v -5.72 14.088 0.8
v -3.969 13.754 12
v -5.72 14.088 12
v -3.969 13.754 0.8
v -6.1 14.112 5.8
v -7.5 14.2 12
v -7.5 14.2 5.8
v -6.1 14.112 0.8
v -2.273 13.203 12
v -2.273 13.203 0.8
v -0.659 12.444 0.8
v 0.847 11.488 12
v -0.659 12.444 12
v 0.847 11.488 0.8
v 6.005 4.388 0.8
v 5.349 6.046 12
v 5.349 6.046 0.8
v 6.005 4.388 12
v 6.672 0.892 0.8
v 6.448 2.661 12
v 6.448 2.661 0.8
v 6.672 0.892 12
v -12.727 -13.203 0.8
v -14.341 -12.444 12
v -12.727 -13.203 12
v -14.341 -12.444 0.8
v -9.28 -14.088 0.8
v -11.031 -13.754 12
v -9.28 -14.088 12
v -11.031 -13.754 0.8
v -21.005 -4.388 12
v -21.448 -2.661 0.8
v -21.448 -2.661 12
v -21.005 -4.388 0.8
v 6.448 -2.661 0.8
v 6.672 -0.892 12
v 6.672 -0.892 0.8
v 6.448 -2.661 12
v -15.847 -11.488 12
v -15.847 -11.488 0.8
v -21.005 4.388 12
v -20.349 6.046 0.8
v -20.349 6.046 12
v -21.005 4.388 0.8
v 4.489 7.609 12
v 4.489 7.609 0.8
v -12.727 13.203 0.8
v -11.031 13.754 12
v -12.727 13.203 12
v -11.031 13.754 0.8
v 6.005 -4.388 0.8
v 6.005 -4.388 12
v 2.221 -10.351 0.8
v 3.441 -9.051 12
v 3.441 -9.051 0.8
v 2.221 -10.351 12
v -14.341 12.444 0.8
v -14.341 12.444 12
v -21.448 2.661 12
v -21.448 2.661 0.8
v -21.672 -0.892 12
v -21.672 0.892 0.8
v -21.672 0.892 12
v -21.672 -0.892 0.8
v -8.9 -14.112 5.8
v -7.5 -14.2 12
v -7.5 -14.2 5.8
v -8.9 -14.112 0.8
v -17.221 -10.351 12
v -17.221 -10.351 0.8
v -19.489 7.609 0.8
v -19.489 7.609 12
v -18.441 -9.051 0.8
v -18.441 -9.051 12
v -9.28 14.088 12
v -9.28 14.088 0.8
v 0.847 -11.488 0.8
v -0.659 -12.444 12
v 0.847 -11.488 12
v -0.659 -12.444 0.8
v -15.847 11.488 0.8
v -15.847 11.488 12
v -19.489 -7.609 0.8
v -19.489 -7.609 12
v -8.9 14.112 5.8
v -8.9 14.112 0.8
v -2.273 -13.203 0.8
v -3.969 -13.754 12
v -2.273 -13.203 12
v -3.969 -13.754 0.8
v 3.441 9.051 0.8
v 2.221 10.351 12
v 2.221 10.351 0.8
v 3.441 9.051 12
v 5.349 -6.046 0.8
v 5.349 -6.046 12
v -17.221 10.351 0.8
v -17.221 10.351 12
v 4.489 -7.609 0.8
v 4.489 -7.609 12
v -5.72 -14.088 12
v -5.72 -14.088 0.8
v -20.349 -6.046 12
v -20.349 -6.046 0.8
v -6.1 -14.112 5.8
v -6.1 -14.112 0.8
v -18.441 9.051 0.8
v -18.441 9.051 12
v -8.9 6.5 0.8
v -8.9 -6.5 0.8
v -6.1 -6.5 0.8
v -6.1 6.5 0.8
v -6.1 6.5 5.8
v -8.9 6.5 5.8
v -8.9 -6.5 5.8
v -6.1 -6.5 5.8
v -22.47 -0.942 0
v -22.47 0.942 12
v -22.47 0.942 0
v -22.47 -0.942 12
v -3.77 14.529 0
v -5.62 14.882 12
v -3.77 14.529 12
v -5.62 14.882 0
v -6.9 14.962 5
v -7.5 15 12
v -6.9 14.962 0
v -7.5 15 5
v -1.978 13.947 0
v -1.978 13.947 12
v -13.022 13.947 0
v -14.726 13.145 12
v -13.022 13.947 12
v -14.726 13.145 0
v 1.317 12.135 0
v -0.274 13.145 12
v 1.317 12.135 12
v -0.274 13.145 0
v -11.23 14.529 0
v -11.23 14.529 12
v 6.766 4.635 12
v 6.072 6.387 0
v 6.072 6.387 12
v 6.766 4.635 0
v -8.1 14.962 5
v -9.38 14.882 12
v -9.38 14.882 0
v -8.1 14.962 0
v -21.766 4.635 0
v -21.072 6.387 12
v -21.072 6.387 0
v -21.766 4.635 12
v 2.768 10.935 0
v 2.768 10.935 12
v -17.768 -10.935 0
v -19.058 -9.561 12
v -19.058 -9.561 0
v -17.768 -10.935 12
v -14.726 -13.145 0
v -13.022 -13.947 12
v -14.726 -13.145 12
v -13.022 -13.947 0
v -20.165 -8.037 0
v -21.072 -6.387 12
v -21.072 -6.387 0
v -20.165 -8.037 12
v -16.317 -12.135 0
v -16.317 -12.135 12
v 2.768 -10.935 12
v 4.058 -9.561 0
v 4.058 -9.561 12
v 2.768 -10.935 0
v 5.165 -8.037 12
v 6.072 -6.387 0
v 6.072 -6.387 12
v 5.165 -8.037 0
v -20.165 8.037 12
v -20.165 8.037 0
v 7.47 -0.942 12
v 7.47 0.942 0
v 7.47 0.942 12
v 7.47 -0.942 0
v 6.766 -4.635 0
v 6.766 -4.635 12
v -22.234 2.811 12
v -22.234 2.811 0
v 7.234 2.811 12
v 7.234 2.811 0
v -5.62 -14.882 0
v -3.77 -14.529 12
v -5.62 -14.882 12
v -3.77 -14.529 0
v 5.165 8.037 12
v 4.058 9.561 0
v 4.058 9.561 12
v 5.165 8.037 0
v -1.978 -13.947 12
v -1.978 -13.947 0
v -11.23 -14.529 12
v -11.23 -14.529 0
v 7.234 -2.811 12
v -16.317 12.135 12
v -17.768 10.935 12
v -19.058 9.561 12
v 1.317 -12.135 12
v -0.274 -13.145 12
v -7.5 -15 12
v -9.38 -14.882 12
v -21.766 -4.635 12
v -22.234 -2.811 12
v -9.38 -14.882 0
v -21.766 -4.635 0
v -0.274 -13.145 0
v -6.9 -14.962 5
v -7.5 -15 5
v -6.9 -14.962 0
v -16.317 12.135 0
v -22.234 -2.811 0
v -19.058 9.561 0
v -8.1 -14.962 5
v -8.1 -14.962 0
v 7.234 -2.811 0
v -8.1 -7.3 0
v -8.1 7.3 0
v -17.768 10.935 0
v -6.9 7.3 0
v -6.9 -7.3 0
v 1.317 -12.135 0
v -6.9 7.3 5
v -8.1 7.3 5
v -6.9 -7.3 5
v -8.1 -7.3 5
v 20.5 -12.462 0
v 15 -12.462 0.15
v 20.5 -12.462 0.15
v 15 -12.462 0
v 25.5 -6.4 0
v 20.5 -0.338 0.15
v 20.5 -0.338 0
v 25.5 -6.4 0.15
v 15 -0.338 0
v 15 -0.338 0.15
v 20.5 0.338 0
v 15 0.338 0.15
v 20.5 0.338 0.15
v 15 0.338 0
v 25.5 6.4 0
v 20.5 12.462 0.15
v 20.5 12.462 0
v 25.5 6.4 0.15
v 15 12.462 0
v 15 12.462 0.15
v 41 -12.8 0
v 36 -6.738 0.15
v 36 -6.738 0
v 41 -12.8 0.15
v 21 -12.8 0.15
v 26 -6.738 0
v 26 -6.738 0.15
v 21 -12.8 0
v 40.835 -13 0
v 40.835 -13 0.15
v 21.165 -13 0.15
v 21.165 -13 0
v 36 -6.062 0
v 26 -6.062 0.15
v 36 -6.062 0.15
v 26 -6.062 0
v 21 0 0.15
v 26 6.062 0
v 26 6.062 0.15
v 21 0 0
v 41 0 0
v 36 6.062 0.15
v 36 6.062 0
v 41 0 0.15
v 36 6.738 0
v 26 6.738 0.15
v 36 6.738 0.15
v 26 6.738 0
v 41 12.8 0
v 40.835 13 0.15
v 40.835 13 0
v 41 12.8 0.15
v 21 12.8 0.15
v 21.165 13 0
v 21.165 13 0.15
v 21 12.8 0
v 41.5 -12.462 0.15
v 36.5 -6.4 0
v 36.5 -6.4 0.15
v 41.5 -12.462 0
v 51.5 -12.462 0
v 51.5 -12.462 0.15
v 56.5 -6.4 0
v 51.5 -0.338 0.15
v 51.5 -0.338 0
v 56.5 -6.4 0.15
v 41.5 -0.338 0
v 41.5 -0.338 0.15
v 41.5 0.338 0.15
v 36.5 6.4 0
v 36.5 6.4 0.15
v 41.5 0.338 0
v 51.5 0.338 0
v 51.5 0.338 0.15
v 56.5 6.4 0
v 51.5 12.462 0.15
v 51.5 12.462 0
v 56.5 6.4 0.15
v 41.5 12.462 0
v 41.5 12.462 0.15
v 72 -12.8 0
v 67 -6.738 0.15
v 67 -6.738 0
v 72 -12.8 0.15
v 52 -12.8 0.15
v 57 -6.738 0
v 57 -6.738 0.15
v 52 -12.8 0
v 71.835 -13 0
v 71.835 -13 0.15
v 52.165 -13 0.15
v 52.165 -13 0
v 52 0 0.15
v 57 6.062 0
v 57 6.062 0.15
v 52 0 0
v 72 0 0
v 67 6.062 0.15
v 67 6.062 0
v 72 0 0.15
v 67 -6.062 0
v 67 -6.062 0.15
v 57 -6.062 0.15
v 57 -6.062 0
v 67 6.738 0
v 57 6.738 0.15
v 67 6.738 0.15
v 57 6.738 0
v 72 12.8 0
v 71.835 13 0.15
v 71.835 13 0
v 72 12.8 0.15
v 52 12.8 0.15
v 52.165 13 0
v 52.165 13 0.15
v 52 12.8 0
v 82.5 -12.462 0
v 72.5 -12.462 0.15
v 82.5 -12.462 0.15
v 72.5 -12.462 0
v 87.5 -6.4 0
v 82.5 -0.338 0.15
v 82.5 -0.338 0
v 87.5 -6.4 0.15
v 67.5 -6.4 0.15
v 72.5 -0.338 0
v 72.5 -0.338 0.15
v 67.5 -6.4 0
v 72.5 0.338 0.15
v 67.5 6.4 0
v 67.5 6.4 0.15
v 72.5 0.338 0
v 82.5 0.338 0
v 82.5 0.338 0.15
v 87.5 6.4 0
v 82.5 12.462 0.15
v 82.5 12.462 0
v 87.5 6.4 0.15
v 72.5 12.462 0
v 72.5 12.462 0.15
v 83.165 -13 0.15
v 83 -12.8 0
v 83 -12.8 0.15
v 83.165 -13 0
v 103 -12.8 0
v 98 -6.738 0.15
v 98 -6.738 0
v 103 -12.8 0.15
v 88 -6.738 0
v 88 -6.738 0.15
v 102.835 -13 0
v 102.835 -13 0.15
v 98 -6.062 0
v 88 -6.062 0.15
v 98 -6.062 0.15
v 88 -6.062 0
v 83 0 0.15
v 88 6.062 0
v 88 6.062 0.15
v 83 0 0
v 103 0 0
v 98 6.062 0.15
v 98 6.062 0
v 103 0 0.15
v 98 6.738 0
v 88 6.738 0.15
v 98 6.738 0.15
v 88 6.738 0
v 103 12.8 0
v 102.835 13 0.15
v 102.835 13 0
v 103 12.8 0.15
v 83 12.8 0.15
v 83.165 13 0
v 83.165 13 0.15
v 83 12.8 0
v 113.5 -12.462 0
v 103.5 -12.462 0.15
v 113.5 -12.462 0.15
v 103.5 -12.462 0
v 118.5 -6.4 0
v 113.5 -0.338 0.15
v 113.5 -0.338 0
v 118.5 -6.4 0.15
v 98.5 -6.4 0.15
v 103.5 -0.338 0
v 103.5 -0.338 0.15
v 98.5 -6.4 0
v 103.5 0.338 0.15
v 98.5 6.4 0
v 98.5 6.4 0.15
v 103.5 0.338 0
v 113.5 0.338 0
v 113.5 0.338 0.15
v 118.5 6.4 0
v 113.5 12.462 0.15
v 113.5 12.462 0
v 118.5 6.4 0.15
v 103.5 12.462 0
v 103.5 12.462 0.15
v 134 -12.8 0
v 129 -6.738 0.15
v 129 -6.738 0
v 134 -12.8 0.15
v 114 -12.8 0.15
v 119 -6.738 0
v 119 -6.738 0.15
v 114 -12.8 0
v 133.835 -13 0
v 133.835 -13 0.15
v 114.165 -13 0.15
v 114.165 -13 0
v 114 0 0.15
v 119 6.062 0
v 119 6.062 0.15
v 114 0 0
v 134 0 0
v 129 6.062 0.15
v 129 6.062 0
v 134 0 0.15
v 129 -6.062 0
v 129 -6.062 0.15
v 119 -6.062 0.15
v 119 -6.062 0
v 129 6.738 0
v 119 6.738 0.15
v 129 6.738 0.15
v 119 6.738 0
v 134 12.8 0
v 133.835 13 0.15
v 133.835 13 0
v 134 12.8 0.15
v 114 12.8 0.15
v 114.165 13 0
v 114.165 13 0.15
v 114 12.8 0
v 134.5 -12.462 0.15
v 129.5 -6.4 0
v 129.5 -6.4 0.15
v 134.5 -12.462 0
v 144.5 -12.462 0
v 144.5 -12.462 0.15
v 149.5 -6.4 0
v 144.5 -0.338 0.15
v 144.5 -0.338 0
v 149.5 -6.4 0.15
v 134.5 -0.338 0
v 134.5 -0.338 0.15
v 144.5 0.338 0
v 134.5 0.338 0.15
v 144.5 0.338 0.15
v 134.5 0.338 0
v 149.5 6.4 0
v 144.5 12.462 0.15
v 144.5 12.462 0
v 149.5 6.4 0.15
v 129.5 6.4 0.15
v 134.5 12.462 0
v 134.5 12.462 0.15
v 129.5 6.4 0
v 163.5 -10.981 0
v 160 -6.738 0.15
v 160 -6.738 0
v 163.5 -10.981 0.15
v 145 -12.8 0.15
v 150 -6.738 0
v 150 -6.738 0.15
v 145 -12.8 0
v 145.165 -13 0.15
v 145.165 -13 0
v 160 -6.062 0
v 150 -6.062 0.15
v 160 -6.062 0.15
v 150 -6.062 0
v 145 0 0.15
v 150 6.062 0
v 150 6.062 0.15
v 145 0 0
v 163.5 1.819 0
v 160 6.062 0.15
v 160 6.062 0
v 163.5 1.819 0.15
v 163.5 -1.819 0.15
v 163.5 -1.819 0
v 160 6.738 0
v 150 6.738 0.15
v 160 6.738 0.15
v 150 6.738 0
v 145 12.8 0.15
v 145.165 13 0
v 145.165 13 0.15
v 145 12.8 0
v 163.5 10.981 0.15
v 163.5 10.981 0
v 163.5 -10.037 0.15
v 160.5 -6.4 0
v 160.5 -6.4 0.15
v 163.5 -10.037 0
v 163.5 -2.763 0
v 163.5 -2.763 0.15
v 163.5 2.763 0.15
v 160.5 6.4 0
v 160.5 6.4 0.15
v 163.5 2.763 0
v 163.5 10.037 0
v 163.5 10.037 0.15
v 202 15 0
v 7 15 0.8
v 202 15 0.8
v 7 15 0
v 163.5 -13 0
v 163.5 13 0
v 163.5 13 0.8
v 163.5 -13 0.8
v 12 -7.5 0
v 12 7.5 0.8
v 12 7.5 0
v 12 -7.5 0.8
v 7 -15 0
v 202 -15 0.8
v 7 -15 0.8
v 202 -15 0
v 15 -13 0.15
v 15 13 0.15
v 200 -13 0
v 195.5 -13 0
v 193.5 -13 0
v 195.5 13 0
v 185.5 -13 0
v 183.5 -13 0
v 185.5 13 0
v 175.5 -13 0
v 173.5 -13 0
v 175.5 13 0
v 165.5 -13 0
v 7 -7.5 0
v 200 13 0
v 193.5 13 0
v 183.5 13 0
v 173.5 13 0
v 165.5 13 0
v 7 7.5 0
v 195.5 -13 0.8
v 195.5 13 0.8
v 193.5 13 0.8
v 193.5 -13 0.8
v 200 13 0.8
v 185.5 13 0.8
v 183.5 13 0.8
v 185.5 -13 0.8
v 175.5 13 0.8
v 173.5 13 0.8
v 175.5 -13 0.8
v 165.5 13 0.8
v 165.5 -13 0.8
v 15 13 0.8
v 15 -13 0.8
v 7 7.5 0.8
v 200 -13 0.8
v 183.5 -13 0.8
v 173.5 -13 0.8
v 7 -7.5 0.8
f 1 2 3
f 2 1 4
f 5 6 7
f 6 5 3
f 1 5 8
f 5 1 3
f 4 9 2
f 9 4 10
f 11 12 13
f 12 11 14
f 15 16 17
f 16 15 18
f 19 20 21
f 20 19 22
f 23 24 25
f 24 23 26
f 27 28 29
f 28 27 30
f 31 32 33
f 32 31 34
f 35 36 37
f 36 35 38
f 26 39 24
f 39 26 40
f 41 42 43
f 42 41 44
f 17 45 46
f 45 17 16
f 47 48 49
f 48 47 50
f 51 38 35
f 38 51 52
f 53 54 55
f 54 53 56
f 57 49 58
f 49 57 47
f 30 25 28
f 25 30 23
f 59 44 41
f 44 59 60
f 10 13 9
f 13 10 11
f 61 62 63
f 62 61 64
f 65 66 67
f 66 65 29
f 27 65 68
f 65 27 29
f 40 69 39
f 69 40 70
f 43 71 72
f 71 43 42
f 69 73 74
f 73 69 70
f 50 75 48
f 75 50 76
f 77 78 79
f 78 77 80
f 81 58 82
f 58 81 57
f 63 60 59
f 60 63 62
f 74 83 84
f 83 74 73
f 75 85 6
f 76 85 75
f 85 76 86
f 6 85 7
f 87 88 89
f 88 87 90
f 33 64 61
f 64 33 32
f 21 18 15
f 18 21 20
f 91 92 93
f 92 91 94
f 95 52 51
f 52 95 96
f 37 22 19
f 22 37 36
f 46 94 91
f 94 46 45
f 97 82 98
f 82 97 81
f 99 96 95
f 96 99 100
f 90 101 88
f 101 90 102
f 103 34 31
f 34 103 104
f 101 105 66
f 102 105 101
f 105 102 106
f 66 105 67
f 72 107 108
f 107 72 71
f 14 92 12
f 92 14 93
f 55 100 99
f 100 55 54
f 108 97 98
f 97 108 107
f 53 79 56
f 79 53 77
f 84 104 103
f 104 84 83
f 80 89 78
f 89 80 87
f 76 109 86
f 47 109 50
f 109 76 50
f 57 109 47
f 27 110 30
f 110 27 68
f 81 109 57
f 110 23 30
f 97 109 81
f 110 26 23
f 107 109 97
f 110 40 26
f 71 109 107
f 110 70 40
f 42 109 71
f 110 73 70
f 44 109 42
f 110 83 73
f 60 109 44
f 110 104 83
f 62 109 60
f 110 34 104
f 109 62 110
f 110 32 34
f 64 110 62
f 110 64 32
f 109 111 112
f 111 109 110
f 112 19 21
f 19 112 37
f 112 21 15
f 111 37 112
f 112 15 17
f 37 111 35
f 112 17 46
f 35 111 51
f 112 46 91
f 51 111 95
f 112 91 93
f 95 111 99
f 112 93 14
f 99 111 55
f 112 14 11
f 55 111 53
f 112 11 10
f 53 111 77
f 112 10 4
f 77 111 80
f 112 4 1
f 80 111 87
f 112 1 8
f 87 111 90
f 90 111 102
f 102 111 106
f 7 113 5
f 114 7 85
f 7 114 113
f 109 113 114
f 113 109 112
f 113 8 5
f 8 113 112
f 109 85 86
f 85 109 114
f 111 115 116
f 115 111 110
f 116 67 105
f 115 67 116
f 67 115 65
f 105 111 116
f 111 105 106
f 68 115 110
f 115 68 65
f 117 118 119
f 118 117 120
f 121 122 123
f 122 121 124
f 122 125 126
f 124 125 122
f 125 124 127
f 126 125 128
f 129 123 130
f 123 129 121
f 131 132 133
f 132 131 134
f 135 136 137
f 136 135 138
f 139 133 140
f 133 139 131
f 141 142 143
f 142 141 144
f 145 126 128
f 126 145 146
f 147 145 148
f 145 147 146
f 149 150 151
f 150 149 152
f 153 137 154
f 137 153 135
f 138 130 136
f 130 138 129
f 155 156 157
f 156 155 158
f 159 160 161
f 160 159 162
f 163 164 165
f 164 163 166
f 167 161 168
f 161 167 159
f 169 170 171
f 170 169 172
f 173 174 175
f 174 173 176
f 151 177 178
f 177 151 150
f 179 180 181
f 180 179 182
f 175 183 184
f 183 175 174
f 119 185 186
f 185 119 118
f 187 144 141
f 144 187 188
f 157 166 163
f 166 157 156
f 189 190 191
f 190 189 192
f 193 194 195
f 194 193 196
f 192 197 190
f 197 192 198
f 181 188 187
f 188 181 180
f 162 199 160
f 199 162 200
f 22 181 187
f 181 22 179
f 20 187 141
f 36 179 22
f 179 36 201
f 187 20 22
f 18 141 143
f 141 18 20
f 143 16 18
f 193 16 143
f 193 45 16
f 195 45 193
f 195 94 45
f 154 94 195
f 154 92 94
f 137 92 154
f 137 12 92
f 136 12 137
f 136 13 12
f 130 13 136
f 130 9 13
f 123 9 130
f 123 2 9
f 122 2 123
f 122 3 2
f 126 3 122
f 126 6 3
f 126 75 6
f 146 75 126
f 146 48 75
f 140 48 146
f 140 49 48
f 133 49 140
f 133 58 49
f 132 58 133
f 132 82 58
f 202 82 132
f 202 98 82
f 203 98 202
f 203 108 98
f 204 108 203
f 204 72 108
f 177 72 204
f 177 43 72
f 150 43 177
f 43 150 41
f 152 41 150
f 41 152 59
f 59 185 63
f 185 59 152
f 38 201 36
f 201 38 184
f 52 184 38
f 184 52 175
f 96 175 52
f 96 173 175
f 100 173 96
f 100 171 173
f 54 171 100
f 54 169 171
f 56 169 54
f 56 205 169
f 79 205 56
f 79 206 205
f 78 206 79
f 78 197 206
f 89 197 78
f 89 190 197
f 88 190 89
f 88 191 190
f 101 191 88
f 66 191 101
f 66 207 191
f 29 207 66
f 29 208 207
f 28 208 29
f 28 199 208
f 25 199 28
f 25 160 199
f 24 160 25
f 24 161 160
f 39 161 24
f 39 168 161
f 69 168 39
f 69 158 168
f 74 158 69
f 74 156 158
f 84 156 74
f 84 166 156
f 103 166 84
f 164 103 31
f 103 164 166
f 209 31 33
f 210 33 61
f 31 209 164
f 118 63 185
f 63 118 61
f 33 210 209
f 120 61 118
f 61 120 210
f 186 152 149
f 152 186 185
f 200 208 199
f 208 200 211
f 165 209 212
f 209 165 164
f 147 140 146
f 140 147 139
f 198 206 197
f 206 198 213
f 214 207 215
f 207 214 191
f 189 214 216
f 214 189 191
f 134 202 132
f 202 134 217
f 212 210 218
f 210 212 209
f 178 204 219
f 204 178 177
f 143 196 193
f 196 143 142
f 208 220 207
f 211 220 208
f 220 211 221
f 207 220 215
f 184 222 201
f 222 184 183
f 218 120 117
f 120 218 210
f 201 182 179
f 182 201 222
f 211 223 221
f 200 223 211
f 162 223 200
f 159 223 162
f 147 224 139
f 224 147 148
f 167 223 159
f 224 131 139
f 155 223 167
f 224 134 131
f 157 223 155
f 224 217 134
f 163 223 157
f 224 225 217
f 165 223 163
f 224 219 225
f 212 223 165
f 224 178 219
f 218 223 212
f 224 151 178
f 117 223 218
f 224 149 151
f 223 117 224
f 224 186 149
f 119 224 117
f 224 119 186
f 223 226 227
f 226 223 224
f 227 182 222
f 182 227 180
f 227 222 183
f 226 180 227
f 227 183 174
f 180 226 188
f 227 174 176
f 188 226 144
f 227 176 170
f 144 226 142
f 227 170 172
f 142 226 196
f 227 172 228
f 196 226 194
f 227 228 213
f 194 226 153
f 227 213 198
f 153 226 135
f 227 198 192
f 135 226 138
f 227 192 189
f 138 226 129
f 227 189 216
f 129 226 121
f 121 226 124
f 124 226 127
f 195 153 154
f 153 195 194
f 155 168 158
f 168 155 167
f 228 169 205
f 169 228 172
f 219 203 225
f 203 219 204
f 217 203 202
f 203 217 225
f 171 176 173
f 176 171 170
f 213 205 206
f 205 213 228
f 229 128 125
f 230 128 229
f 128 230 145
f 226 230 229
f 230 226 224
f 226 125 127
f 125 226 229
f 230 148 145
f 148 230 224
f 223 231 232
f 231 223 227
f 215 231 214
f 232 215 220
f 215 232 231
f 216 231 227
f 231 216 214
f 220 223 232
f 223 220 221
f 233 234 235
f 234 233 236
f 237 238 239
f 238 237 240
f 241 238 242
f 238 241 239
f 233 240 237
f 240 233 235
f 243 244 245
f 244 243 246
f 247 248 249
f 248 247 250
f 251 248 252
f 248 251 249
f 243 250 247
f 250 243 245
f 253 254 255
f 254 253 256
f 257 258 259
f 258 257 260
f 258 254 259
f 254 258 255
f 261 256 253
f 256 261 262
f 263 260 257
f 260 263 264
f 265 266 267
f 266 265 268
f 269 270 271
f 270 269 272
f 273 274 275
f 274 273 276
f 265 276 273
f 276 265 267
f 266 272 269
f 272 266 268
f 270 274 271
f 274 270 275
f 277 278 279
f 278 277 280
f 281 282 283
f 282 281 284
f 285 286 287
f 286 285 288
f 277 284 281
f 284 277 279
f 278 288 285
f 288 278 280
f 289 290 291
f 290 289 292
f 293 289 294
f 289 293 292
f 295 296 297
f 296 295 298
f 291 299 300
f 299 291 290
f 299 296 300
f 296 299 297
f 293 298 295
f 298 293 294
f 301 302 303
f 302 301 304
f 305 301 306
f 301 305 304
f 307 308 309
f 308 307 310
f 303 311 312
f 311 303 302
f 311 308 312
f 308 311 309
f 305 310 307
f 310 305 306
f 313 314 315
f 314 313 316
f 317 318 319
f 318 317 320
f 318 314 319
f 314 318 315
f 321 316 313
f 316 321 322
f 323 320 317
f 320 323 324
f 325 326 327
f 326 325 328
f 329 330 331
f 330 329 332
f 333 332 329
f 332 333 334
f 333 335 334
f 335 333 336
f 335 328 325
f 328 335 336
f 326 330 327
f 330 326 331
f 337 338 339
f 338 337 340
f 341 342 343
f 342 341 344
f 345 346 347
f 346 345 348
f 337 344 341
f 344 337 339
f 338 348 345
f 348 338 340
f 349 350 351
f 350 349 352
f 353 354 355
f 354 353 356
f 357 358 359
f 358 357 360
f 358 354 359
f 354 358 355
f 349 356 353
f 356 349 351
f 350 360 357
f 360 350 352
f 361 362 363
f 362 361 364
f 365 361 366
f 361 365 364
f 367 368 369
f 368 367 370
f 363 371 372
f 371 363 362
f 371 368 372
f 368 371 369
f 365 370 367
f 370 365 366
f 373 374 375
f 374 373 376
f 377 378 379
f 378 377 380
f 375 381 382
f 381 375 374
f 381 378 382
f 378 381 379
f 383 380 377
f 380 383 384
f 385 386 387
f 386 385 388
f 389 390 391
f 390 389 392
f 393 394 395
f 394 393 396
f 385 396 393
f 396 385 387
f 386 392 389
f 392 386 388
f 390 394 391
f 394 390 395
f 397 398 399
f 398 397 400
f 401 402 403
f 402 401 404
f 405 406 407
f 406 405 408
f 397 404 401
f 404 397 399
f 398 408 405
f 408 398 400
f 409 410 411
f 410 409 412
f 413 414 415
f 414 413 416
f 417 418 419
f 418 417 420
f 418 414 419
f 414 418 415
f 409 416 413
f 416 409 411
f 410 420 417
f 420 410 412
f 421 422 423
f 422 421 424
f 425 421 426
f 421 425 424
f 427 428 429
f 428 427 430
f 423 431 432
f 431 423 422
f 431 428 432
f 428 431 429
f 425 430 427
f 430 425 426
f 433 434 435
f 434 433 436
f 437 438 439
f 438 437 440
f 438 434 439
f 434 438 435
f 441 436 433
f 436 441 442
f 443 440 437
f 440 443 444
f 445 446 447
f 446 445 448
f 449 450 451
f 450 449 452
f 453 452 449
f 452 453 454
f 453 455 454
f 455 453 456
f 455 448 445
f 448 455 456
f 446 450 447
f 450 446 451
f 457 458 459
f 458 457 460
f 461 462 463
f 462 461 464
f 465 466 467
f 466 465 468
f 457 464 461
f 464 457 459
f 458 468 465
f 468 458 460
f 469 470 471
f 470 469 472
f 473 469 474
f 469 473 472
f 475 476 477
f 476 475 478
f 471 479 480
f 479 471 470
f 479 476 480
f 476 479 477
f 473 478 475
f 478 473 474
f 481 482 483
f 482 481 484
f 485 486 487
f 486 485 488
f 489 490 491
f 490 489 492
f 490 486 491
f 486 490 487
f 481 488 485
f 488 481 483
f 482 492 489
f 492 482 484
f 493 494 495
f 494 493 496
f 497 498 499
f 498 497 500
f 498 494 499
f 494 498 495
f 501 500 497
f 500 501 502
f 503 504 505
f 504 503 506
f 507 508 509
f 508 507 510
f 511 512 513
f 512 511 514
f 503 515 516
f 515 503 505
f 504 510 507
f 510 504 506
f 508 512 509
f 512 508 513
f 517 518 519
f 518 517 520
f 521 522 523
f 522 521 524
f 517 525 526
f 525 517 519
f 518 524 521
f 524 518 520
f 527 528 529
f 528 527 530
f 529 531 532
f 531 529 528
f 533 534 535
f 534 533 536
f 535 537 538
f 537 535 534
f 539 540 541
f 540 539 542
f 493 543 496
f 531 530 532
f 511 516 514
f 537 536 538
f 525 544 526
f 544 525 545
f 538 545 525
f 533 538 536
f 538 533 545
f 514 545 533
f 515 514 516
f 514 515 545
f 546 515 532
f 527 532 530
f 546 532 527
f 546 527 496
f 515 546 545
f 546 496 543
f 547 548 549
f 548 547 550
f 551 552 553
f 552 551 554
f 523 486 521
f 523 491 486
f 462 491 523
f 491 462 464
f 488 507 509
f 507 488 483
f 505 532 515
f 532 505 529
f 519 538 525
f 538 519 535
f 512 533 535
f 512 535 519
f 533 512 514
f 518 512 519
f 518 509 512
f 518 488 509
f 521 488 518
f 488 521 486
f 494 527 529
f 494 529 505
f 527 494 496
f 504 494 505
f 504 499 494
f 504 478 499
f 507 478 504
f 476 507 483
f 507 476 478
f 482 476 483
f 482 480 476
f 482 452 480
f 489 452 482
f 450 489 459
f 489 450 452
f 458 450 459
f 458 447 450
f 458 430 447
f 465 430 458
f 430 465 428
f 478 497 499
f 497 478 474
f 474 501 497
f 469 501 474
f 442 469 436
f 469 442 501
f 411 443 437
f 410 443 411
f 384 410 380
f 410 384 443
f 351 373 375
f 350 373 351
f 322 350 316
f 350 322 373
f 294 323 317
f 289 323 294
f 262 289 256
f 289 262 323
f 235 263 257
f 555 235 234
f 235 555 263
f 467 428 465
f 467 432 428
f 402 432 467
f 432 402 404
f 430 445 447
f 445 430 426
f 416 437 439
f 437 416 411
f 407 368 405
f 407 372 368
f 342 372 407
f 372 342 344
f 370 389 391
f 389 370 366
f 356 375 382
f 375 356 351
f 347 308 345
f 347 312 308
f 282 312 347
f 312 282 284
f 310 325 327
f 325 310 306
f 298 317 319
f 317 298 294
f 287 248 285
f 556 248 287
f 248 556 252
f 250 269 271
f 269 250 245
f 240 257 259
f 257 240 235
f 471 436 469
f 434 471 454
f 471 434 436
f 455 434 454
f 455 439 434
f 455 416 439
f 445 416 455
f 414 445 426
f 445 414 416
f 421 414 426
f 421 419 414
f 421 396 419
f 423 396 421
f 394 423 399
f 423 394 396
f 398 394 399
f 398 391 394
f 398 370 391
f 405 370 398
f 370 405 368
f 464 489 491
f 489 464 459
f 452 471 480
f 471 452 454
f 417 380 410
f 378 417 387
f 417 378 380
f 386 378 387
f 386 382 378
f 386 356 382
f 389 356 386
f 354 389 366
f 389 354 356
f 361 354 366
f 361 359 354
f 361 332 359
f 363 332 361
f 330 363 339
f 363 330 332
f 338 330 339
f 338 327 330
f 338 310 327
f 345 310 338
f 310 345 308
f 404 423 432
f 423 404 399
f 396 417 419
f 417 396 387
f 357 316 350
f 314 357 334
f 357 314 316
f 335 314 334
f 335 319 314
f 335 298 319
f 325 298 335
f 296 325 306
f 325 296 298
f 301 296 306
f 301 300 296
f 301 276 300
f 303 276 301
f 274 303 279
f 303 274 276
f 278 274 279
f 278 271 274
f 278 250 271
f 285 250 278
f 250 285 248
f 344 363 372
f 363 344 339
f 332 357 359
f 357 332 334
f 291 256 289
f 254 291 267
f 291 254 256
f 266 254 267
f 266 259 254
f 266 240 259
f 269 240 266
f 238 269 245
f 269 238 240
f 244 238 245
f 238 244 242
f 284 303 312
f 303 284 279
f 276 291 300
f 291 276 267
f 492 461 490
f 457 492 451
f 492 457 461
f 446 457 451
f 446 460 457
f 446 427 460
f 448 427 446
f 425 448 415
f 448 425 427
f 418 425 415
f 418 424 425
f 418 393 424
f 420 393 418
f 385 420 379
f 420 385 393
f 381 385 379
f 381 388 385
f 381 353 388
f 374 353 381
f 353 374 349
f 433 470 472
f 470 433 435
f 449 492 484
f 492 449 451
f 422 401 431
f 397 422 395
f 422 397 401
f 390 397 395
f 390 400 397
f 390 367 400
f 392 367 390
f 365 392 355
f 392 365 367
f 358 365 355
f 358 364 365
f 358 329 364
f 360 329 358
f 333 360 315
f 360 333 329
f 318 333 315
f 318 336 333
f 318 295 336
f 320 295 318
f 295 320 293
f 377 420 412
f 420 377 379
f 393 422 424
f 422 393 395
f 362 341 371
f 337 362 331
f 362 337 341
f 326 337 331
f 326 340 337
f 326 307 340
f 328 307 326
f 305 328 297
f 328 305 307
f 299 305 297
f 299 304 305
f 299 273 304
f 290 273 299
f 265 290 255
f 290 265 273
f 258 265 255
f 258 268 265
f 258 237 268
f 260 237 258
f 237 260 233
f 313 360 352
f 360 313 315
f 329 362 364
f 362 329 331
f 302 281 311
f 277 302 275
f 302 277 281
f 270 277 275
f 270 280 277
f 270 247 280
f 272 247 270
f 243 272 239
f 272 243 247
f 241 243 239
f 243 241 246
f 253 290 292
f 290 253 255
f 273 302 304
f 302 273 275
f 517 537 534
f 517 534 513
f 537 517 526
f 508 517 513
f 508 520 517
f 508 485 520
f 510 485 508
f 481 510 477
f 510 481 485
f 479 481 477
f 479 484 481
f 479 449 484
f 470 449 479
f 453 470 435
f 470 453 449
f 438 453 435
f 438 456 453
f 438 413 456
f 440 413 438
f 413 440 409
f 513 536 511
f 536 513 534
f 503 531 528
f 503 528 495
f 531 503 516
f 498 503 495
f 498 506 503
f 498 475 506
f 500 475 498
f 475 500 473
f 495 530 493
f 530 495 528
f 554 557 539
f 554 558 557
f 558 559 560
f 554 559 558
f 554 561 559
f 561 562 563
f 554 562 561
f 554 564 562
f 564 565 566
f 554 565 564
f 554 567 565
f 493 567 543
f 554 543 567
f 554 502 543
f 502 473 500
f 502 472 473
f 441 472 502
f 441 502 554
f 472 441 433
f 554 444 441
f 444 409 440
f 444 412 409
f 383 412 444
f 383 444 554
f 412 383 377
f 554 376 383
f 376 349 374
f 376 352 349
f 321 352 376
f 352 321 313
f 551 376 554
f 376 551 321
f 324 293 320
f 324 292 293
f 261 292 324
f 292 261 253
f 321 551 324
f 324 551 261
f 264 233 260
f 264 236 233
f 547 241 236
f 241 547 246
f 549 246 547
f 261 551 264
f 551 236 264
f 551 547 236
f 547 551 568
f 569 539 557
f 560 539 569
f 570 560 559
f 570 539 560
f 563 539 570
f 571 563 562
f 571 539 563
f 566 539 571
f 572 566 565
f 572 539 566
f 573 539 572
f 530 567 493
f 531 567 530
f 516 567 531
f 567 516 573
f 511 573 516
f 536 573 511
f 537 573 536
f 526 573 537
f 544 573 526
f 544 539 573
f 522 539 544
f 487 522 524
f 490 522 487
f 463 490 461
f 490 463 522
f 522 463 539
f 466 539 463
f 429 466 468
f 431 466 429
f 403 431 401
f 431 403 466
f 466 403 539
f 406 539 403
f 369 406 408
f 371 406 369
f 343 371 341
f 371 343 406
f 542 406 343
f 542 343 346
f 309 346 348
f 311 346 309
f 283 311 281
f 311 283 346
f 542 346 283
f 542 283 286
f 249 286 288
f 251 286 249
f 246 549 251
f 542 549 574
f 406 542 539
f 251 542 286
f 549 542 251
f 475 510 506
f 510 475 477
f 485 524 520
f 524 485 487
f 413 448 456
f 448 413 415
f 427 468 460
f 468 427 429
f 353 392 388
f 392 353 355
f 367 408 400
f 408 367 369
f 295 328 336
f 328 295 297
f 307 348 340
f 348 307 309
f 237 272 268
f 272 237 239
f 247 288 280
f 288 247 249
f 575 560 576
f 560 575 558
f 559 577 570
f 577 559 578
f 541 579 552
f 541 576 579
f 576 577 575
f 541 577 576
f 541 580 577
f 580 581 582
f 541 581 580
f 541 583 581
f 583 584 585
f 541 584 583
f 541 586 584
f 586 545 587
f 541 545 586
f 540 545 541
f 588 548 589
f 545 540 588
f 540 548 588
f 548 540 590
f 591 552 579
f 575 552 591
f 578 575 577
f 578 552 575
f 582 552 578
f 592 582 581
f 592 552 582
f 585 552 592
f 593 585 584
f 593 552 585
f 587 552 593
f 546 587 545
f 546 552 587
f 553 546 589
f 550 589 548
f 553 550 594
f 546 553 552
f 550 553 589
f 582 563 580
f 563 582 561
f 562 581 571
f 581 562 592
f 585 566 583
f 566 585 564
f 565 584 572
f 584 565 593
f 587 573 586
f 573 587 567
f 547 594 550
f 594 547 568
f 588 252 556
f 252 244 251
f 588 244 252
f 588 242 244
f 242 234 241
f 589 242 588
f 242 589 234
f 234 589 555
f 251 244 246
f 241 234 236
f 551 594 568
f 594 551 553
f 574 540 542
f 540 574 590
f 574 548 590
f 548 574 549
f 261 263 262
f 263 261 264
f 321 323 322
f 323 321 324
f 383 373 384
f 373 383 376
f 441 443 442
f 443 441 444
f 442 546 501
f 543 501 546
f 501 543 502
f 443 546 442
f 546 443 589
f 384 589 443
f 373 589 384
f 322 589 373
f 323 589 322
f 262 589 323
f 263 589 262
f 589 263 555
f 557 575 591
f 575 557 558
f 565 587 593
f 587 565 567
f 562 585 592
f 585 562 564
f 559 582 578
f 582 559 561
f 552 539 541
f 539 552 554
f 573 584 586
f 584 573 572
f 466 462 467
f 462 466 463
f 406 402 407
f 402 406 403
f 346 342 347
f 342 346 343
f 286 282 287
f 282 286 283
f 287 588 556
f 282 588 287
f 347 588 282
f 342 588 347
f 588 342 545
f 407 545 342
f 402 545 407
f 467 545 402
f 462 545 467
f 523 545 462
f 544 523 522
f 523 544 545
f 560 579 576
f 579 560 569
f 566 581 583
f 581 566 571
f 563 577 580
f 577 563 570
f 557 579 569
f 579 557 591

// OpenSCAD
// total height (to top of marker)
h=202;
// [202,293]

// cup height
hw=12;

// width of marker (and bell)
w=30;

// thickness of material
t=0.8;

// mininum thickness of meter
tm=0.15;

// cutout circles diameter
cd=24;

// cutout circle minimum distance
cdd=2;

// top marker area height
tl=38.5;

// slot for meter
slh=5;

// material margin
margin=0.2;

// distance between markers, 10.8mm = 0.5l for 25cm bucket, 7.5mm = 0.5l for 30cm bucket
mark_distance=10.0;
// [10.8,7.5]

// how much the weight of the stick pushes it down
mark_top_error=1.5;

// rail width
rw=2;

// marker height
mh=2;

d=w;

offs=w/4;
       
module cup()
{
   difference()
   {
      cylinder(h=hw,r=w/2);
 
      translate([offs-margin,-t/2-margin,hw-slh]) cube([w,t+margin*2,20]);
      translate([-offs-w+margin,-t/2-margin,hw-slh]) cube([w,t+margin*2,20]);

      difference()
      {
         translate([0,0,-t])
            cylinder(h=hw,r=w/2-t);

         translate([offs-t-margin,-t/2-t-margin,hw-slh-t]) cube([w,t*3+margin*2,20]);
         translate([-offs-w+t+margin,-t/2-t-margin,hw-slh-t]) cube([w,t*3+margin*2,20]);
      }
   }
}
  
module meter()
{
//   translate([-w/2,-t/2,0])
   {
      difference()
      {
         translate([0,0,hw])
            cube([w,tm,h-hw-tl]);

         {
            hexr=10;
            sx=hexr+2.8;
            sy=hexr*2-4.5;
            rat=0.70;
                  
            nx=1+h/sx;
                  
            for (j=[0:1:1+h/sy])
               for (i=[-2:1:2])
                  translate([w/2+i*sx + ((j%2)?0.5:0)*sx,t*3,j*sy])
                     scale([rat,1,1])
                     rotate([0,90,0])
                     rotate([90,0,0])
                     cylinder(h=5*4,r=hexr,$fn=6);
         }
         
      }

      translate([0,0,hw-slh]) cube([w/2-offs,t,3+slh]);
      translate([w/2+offs,0,hw-slh]) cube([w/2-offs,t,3+slh]);
      translate([0,0,hw]) cube([w,t,3]);

      // rails
      translate([0,0,hw]) cube([rw,t,h-hw]);
      translate([w-rw,0,hw]) cube([rw,t,h-hw]);

      // markers
      translate([0,0,h-tl]) cube([w,t,mh]);
      translate([0,0,h-mh]) cube([w,t,mh]);

   md=(w-cd)/2;
      
   if (1)
      for (i=[mark_distance-mark_top_error:mark_distance:tl])
         translate([0,0,h-i])
            cube([w,t,mh]);
   }
}

if (0) // combine
{
   cup($fn=50);

   translate([-w/2,-t/2,0])
      meter();
}
else if (1) // split
   rotate([0,0,90])
{
   if (h+w>240)
   translate([-w*1.1,-w,hw])
   rotate([180,0,0])
   cup($fn=50);
   else
   translate([0,w/4,hw])
   rotate([180,0,0])
   cup($fn=50);
   
   rotate([90,0,0])
   translate([-w/2,0,0])
      meter();
}
